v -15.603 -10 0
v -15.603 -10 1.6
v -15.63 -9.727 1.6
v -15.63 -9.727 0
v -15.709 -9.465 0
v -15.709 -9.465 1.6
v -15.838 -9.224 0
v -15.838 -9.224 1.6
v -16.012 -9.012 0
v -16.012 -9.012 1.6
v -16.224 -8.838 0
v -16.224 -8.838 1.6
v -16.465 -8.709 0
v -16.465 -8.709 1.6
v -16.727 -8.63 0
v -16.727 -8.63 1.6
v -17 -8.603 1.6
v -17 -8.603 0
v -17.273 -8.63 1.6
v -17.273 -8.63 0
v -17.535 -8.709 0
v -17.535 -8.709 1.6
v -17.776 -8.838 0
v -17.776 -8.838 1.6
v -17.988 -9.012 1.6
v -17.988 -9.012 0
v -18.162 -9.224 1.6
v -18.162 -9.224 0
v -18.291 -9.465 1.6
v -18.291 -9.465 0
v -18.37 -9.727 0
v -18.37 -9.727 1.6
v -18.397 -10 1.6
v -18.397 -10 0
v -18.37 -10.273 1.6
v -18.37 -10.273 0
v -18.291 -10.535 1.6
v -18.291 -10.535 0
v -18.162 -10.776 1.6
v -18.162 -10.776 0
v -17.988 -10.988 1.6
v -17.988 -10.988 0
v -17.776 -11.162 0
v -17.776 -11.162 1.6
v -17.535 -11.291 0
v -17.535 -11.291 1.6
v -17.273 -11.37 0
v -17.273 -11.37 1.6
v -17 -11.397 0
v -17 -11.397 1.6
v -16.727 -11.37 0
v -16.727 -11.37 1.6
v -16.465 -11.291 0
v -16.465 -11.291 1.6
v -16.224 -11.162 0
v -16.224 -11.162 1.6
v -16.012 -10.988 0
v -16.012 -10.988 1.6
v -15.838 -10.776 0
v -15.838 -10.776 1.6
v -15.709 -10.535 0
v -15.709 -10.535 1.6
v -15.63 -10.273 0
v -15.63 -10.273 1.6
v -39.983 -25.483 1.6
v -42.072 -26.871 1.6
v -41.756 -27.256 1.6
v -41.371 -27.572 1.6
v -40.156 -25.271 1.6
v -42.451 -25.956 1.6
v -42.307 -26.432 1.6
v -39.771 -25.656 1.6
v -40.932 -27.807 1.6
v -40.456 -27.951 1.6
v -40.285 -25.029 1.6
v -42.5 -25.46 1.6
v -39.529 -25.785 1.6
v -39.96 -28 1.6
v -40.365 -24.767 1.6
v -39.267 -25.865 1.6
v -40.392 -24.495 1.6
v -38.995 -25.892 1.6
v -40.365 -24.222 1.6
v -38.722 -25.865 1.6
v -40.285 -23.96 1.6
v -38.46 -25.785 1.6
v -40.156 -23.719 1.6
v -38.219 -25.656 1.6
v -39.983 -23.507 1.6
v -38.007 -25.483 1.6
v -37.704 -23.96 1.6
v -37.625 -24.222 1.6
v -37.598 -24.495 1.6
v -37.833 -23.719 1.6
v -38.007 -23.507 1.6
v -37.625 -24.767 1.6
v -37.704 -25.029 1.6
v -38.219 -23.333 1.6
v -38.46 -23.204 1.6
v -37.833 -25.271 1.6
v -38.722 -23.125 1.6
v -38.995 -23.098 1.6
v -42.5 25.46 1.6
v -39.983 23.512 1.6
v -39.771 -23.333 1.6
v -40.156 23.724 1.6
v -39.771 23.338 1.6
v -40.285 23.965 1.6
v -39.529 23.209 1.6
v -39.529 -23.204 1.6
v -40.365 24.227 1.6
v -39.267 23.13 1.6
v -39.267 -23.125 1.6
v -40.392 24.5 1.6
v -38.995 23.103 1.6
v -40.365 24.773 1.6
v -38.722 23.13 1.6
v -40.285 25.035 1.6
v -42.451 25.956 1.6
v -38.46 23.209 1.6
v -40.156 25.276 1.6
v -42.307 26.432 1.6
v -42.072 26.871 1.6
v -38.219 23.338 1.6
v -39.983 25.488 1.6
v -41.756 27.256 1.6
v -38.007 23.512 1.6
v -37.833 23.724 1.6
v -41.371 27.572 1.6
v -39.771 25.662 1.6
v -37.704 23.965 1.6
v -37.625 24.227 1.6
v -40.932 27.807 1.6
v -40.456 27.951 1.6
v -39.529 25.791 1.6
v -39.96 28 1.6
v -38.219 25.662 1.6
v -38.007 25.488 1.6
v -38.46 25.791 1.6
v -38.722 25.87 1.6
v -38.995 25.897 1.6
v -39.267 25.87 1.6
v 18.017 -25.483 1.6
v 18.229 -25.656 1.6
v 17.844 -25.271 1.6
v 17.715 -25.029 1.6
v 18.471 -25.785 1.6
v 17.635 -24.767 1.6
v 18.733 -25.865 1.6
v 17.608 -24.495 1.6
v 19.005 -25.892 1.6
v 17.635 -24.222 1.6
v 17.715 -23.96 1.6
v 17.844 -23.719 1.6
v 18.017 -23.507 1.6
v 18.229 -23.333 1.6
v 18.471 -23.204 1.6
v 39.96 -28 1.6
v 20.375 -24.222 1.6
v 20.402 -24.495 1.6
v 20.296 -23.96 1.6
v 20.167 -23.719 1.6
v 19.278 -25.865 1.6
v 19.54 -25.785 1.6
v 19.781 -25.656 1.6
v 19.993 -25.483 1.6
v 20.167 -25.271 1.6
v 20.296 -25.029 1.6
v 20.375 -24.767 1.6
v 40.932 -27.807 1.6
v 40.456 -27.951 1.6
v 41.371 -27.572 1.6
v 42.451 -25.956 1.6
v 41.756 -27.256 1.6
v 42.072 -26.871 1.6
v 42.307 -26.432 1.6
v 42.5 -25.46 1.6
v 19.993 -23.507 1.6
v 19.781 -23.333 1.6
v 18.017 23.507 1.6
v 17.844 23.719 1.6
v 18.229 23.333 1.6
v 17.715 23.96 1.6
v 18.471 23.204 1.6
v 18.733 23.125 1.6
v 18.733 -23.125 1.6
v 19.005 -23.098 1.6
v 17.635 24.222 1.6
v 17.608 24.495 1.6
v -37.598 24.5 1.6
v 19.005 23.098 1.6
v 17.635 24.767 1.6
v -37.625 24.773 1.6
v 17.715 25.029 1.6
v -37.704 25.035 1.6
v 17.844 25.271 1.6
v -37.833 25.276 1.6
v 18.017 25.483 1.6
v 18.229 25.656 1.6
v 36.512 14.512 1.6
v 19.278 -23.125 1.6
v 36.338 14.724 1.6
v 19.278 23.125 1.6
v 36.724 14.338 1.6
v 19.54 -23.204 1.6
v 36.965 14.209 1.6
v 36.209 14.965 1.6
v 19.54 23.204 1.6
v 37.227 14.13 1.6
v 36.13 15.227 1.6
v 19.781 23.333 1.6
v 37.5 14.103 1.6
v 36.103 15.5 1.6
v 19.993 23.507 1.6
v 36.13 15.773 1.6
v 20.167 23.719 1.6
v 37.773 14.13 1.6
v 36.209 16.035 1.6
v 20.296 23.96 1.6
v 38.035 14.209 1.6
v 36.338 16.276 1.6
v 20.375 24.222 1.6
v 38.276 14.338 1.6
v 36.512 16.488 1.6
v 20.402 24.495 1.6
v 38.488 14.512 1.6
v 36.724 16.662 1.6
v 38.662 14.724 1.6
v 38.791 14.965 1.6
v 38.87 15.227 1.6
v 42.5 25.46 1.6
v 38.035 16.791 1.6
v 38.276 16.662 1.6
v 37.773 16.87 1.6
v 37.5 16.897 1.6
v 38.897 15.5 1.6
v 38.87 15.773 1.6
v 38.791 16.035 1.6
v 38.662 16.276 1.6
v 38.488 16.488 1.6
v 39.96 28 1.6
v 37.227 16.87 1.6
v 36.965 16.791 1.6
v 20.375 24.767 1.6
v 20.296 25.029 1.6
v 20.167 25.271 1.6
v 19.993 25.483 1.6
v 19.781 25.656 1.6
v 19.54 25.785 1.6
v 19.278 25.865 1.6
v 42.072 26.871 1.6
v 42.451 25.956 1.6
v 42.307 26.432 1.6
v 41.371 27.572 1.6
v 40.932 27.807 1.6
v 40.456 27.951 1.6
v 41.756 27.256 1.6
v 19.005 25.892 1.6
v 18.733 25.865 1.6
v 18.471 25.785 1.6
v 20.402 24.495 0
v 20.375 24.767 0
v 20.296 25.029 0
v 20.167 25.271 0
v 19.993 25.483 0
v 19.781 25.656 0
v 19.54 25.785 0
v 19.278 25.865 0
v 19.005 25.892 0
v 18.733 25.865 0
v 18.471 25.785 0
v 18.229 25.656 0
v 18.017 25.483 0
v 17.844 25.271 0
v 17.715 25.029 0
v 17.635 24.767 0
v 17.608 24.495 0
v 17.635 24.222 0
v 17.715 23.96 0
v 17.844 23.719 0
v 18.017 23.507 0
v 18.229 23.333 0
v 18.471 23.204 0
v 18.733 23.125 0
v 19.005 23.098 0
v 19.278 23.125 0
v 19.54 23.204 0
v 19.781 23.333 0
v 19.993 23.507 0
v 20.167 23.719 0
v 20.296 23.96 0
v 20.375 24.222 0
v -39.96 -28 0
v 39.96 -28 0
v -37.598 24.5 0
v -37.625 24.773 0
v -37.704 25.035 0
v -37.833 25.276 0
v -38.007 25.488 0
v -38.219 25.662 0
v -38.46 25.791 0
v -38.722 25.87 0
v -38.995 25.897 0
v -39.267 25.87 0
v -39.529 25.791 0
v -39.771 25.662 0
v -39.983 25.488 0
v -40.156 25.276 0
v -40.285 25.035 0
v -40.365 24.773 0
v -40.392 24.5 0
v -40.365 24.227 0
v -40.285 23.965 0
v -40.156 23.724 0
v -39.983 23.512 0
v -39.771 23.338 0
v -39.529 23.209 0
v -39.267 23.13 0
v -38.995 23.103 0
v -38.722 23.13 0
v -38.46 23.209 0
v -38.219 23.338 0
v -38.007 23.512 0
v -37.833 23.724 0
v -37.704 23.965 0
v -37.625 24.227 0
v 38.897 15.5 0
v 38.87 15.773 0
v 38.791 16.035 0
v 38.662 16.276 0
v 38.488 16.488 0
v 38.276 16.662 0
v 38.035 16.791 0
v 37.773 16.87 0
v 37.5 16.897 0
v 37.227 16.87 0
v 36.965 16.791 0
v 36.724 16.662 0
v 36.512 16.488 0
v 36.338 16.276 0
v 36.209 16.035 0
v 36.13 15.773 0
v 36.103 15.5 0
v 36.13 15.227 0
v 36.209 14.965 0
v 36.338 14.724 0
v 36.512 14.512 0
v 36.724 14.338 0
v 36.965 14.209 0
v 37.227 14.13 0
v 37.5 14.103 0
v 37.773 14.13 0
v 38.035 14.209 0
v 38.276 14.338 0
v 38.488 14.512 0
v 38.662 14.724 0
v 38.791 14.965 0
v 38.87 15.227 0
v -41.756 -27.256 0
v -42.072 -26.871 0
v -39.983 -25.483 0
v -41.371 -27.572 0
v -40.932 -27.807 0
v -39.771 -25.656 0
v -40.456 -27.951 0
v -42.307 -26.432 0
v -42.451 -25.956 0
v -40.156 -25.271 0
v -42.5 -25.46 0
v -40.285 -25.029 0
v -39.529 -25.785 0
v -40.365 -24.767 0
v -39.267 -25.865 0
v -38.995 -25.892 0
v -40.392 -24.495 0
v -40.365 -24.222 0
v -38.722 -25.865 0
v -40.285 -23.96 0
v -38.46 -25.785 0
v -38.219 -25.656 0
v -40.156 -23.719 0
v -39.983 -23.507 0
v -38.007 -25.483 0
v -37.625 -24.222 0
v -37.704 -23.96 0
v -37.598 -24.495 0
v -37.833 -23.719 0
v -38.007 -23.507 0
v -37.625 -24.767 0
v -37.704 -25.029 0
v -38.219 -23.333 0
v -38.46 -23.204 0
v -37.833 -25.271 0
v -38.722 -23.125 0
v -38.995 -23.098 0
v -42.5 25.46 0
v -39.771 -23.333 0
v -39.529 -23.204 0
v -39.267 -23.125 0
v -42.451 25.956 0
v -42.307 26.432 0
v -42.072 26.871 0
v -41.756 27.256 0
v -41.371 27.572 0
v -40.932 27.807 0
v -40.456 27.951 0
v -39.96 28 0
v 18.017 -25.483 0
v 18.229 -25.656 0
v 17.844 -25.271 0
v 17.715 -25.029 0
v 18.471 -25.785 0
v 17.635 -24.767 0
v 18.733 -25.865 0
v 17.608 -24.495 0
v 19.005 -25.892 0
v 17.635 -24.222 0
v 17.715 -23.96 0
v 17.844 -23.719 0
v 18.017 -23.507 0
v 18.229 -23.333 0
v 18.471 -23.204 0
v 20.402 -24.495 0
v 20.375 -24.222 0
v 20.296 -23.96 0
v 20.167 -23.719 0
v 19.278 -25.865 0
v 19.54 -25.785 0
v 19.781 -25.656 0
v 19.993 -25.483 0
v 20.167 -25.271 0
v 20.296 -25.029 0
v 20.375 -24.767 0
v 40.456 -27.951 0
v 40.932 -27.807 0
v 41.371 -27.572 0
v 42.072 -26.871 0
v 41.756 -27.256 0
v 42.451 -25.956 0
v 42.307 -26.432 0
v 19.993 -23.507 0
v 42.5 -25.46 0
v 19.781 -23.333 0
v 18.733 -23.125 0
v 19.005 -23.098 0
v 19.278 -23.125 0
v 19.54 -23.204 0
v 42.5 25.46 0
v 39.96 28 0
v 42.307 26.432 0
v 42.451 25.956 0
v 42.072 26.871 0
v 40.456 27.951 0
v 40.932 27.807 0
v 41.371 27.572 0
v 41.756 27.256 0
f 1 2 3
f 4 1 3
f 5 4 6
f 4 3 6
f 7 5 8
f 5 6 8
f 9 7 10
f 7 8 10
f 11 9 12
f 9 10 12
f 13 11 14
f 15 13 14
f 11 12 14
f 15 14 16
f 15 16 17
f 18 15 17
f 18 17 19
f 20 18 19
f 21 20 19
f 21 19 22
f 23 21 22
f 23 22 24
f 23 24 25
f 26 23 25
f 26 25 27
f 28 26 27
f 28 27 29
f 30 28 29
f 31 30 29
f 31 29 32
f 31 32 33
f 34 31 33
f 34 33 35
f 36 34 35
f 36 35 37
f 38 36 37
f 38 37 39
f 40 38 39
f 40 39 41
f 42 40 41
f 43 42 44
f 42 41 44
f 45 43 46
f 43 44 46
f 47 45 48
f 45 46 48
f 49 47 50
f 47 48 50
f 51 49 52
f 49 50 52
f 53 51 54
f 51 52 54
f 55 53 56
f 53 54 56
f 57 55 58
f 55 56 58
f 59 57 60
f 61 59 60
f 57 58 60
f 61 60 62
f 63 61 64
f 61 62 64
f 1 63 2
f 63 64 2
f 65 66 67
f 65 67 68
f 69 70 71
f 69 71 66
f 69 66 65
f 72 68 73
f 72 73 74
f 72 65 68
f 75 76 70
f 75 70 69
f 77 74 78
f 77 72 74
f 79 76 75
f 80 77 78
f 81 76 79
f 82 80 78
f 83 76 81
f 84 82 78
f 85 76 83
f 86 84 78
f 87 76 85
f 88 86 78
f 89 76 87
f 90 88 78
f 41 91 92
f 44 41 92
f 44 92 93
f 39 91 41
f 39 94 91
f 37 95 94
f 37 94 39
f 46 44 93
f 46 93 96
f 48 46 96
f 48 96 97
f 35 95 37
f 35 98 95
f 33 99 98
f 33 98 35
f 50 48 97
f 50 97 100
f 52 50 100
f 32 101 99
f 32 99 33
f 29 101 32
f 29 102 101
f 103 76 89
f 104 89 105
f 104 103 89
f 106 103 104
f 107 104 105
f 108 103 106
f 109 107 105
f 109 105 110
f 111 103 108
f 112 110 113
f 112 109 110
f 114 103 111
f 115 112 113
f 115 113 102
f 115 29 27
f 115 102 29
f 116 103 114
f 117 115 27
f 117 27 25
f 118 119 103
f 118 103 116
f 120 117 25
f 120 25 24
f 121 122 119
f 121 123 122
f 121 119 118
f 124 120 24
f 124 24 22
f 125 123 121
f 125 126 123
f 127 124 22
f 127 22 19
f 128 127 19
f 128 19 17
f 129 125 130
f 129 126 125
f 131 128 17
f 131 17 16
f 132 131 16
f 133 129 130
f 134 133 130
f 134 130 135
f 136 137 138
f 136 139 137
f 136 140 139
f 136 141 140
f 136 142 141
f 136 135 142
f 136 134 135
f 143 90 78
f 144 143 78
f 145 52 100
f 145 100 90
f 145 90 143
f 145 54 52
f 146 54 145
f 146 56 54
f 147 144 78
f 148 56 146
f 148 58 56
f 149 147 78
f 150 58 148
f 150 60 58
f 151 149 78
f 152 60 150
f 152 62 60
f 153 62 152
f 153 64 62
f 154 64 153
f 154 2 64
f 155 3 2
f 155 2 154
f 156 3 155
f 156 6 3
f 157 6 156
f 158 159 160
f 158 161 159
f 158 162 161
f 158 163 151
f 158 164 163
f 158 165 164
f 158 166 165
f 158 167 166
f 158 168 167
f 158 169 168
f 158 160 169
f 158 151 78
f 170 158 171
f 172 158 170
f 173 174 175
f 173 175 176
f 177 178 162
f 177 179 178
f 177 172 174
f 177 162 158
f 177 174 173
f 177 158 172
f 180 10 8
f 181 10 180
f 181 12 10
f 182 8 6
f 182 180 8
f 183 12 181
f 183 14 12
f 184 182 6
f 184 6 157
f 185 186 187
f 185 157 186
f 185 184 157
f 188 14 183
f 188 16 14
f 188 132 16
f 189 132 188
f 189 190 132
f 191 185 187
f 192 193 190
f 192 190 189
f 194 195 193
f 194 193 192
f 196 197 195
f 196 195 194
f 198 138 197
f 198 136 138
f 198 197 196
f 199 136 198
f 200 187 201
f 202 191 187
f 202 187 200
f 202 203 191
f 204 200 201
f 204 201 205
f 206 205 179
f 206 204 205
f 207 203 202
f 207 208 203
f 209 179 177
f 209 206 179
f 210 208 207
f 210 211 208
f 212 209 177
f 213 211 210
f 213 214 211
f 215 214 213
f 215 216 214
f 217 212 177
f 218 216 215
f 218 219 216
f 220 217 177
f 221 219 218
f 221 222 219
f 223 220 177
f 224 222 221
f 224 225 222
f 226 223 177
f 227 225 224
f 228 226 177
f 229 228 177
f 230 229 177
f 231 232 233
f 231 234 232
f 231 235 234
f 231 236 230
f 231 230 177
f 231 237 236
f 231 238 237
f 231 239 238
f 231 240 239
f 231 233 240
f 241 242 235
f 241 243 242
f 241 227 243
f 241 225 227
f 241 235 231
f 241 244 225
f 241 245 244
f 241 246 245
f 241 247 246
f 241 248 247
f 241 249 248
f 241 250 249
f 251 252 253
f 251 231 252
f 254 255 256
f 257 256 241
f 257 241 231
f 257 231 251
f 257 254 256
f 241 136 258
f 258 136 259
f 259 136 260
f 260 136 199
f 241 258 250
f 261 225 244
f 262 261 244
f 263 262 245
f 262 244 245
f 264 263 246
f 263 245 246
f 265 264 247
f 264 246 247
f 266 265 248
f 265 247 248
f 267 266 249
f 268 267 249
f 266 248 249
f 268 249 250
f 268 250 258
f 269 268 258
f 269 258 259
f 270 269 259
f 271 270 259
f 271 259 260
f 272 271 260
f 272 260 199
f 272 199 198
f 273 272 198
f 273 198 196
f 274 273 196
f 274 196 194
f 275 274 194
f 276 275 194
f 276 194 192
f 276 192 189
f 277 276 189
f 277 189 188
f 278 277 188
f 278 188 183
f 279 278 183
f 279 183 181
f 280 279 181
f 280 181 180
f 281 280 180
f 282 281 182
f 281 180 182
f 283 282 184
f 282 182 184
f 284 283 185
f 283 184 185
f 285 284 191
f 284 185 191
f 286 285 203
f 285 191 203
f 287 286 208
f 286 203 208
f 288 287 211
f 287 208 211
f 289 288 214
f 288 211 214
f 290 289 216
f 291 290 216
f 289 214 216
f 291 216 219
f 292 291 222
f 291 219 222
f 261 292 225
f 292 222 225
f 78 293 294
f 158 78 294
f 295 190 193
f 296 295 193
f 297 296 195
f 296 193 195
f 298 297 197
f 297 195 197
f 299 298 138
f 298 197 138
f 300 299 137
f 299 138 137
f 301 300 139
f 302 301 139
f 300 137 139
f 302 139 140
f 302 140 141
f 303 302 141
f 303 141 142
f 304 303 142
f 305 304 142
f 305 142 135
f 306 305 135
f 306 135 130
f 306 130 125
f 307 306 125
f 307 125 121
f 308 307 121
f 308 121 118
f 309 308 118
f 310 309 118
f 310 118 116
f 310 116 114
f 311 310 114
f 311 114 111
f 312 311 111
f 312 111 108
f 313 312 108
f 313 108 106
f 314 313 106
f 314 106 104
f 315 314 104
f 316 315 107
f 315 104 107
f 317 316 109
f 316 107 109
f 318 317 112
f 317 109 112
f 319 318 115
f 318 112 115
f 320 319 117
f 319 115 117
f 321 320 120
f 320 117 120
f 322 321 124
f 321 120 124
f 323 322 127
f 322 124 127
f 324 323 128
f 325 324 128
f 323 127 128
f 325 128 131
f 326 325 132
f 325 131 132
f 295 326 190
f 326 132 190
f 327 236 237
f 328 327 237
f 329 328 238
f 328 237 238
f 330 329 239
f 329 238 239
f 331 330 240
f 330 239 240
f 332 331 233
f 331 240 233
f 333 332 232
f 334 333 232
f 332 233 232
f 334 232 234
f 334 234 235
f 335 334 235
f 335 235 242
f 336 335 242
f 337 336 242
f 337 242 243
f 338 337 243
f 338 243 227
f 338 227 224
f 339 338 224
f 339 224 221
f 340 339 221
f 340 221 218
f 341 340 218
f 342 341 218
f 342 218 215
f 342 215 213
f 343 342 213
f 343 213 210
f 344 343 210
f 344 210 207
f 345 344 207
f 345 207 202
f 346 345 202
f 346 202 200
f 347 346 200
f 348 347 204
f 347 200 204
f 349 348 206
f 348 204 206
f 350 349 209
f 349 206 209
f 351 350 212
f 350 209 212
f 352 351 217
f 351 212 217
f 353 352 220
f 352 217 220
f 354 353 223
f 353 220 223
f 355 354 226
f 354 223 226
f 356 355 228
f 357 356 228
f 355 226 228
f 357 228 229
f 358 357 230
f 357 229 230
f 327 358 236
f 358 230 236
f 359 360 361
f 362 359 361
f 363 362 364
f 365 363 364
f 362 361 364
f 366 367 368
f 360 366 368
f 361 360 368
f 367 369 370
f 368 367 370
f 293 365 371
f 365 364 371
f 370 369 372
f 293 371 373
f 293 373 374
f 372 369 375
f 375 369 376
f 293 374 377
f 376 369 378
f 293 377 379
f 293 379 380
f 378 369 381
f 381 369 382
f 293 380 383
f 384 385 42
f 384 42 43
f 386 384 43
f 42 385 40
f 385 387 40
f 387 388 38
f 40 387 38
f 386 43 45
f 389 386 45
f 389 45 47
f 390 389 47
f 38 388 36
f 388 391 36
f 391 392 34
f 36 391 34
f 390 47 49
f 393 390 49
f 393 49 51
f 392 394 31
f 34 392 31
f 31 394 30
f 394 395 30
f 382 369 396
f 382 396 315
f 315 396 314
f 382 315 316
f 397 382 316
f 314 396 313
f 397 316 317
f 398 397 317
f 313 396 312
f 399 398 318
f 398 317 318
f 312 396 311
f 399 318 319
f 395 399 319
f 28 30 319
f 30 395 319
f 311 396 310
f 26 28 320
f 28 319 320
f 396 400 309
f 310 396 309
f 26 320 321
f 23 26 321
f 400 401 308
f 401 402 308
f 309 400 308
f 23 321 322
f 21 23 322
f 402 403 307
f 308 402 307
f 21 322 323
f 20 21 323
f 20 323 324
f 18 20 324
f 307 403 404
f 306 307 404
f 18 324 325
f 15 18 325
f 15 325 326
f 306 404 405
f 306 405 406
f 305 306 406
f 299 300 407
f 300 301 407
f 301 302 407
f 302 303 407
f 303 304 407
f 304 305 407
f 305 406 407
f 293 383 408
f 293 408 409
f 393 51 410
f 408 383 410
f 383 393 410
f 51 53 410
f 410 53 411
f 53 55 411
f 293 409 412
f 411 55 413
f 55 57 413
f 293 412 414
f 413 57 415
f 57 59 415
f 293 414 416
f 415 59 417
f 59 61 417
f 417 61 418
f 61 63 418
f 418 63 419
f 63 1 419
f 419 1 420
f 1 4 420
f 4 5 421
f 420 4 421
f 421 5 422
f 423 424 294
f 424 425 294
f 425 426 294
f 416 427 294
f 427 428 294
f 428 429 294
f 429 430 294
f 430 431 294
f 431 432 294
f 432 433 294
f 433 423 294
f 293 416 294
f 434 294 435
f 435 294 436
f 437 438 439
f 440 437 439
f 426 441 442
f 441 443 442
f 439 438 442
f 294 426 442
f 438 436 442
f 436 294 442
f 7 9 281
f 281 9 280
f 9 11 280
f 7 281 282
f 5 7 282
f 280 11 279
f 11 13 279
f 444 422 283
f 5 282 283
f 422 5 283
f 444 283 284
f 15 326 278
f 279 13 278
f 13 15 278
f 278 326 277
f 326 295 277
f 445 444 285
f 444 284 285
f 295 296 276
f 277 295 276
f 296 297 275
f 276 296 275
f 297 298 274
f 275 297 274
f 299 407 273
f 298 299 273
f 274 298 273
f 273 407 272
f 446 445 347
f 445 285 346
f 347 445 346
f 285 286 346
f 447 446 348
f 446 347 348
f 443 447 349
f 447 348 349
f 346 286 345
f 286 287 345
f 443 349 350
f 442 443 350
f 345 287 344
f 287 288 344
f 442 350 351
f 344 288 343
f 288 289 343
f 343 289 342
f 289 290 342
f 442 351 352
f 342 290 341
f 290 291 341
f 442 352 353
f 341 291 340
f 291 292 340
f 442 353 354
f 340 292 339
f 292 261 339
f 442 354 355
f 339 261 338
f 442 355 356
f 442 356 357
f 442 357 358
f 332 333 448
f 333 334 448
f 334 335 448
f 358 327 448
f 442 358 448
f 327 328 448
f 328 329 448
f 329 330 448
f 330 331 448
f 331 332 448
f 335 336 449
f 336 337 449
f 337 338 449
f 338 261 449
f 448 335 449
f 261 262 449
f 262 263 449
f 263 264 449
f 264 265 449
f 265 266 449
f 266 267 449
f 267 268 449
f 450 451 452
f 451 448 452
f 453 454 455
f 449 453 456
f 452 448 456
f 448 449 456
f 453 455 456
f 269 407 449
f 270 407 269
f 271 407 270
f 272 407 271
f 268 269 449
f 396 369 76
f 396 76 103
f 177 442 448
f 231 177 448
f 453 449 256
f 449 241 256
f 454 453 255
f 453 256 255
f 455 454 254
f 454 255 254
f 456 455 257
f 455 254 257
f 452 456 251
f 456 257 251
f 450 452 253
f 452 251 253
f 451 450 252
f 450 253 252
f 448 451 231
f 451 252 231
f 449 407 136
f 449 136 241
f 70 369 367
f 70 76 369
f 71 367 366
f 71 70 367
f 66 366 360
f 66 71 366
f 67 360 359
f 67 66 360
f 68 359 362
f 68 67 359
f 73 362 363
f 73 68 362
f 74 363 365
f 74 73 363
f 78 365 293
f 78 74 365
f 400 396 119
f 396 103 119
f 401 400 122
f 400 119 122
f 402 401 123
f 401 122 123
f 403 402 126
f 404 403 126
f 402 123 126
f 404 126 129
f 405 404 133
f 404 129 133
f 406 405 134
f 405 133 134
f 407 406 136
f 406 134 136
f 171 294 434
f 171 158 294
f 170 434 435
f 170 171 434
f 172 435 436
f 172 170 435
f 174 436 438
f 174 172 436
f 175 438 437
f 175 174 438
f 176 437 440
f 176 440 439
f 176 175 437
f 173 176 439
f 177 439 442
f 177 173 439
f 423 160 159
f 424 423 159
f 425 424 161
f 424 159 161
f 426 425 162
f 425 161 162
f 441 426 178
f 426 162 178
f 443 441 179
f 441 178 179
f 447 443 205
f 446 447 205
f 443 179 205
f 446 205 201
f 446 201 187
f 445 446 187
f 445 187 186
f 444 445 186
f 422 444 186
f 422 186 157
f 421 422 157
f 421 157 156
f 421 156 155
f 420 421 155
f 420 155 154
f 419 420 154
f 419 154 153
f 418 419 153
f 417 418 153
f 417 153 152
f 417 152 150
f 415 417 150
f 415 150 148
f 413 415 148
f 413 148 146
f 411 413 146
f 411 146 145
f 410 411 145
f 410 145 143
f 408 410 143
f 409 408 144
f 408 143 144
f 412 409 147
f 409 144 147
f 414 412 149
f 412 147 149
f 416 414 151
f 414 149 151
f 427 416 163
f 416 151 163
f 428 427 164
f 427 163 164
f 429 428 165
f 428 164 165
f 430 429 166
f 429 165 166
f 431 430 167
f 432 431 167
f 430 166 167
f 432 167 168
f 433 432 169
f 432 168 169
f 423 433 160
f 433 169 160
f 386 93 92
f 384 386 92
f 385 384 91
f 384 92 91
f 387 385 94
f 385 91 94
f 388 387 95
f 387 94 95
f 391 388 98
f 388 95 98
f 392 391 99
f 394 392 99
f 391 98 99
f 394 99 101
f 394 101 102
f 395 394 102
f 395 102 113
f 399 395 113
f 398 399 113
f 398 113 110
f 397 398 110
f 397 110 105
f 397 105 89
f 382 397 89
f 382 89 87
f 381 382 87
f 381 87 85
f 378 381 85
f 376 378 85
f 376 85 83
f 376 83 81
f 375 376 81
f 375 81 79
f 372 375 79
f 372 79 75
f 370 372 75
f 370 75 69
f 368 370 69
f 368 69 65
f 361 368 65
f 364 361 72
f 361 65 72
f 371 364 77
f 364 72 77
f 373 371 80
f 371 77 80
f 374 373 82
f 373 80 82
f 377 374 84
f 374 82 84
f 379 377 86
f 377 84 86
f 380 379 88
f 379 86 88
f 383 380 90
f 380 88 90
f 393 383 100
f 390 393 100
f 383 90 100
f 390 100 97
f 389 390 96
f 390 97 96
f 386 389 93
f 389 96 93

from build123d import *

# Parameters (mm, degrees)
F0_W     = 85
F0_H     = 56
F1_DEPTH = 1.6002
F2_R     = 1.397
F3_DEPTH = 25.4
F4_R     = 1.397
F5_DEPTH = 25.4
F6_R     = 2.54


with BuildPart() as f1:
    # F0 (on Top) → F1 (new body)
    with BuildSketch(Plane.XY):
        Rectangle(F0_W, F0_H)
    extrude(amount=F1_DEPTH)

    # F2 (on face) → F3 (cut)
    with BuildSketch(Plane.XY.offset(1.6002)):
        with Locations((-38.9948, 24.5)):
            Circle(F2_R)
        with Locations((-38.9948, -24.4948)):
            Circle(F2_R)
        with Locations((19.0052, 24.4948)):
            Circle(F2_R)
        with Locations((19.0052, -24.4948)):
            Circle(F2_R)
    extrude(amount=-F3_DEPTH, mode=Mode.SUBTRACT)

    # F4 (on face) → F5 (cut)
    with BuildSketch(Plane.XY.offset(1.6002)):
        with Locations((-17, -10)):
            Circle(F4_R)
        with Locations((37.5, 15.5)):
            Circle(F4_R)
    extrude(amount=-F5_DEPTH, mode=Mode.SUBTRACT)

    # F6
    f6_edges = [f1.edges().sort_by_distance(p)[0] for p in [
        (-42.5, -28, 0.8001),
        (42.5, -28, 0.8001),
        (42.5, 28, 0.8001),
        (-42.5, 28, 0.8001),
    ]]
    fillet(f6_edges, radius=F6_R)


solid = f1.part
